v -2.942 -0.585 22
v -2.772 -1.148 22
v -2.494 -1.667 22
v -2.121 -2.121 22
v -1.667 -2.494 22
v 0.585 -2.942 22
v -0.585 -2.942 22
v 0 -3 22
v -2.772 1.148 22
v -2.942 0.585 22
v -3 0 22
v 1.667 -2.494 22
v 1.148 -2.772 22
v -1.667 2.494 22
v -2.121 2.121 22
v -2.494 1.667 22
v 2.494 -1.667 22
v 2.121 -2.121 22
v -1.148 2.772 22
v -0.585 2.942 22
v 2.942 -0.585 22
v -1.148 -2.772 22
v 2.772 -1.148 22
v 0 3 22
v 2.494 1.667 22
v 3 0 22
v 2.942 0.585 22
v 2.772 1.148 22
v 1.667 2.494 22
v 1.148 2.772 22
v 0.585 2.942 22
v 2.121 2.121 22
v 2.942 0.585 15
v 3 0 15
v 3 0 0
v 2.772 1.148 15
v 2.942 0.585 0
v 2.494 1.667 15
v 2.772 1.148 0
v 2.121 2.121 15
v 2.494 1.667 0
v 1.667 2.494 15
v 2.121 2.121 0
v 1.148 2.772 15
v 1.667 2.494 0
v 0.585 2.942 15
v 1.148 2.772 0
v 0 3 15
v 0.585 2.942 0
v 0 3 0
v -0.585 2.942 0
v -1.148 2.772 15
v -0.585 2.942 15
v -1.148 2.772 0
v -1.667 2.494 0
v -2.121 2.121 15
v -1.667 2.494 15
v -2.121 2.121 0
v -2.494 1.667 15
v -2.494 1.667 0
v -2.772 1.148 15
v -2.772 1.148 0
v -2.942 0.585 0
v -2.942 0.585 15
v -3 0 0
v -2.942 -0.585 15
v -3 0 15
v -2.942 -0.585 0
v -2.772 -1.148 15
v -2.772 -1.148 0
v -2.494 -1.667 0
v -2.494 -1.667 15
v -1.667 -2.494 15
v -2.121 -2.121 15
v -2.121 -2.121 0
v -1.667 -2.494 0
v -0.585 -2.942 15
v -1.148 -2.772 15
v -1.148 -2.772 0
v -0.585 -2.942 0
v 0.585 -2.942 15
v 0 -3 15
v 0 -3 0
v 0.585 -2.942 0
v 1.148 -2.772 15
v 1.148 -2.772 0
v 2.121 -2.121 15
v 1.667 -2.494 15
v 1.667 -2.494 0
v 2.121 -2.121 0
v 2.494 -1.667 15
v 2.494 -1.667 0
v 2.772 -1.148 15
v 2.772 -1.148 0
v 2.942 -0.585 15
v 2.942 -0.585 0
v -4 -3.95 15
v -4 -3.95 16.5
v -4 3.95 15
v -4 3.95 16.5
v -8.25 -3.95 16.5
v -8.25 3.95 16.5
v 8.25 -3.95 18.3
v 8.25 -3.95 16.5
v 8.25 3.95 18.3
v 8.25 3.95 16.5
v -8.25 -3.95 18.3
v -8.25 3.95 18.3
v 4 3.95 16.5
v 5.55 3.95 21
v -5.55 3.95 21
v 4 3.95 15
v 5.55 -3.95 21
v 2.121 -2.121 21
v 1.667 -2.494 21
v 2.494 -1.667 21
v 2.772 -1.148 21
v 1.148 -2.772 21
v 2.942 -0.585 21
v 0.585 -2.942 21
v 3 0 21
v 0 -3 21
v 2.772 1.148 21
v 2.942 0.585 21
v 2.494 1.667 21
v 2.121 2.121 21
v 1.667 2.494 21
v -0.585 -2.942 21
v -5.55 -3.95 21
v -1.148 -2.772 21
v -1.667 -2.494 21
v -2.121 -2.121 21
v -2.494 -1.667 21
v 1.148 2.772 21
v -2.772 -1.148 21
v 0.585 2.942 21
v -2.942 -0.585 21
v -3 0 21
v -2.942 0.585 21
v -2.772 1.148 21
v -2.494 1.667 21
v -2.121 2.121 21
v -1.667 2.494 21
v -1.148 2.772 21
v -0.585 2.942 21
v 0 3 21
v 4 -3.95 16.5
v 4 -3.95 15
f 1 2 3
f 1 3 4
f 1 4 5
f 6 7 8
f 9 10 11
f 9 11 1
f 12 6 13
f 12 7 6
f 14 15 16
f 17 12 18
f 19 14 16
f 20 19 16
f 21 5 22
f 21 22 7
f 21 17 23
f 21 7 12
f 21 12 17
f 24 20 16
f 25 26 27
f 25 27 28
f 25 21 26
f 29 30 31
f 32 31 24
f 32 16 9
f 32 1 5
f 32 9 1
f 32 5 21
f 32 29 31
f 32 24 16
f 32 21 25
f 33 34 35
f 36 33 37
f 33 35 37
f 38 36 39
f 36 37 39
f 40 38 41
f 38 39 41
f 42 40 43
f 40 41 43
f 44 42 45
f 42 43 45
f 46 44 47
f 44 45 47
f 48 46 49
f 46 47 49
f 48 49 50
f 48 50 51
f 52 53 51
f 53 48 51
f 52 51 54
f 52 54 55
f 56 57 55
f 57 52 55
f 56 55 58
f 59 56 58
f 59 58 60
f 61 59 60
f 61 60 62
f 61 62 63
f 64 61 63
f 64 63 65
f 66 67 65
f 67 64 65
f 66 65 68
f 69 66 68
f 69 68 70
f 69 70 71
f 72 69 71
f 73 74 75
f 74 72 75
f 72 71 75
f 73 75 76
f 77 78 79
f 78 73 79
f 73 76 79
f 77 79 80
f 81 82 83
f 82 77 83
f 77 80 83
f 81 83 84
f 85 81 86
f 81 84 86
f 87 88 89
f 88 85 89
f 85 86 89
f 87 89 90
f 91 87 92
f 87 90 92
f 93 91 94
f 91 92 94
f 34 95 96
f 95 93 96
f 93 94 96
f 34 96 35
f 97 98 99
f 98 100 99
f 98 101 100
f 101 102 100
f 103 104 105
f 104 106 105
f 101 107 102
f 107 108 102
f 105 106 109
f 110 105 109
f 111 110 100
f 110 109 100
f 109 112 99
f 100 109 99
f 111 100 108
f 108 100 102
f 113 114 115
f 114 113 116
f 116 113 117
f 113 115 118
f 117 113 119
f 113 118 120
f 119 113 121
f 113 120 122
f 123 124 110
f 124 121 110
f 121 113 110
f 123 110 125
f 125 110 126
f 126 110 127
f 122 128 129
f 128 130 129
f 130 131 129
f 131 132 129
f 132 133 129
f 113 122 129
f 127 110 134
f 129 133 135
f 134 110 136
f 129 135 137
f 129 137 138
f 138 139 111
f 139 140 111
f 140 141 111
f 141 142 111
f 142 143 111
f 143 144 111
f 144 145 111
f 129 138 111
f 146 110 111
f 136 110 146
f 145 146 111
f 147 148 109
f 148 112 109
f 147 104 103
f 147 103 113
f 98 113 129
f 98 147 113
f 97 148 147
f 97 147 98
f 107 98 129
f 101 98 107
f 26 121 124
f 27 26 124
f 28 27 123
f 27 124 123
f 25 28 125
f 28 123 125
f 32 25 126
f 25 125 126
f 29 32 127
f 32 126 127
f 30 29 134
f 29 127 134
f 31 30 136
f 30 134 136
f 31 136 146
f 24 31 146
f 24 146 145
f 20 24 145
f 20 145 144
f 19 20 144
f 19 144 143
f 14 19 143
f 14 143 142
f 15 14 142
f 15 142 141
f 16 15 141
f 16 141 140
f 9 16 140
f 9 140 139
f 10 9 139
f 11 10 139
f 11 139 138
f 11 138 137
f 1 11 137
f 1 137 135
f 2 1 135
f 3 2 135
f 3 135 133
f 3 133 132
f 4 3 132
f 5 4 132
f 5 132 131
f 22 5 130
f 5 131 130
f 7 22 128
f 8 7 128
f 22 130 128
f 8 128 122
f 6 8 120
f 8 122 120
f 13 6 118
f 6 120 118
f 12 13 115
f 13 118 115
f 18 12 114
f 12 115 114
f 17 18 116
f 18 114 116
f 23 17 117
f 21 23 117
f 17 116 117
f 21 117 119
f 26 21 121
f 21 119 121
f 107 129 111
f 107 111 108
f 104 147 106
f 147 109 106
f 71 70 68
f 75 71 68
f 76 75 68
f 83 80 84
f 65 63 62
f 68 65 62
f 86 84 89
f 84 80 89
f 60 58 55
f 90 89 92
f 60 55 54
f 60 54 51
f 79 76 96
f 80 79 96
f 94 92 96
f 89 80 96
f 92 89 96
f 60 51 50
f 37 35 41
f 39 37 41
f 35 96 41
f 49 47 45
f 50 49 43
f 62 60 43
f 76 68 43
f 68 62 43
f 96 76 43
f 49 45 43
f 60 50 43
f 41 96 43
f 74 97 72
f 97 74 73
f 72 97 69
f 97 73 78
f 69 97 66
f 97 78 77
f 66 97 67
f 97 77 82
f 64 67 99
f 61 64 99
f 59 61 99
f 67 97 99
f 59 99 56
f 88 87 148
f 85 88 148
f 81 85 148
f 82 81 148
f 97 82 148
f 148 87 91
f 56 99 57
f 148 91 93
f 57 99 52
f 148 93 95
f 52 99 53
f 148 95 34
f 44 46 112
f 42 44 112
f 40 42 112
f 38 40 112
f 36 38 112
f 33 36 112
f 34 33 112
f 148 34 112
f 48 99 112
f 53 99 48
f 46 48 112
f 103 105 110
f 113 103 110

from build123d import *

# Parameters (mm, degrees)
SKETCH1_R           = 3
BOSS_EXTRUDE1_DEPTH = 22
BOSS_EXTRUDE2_DEPTH = 3.95


with BuildPart() as part:
    # Sketch1 → Boss-Extrude1 (new body)
    with BuildSketch(Plane.XY):
        Circle(SKETCH1_R)
    extrude(amount=BOSS_EXTRUDE1_DEPTH)

    # Sketch2 → Boss-Extrude2 (add, symmetric)
    with BuildSketch(Plane(origin=(0, 0, 0), x_dir=(1, 0, 0), z_dir=(0, 1, 0))):
        Polygon((-5.55, -21), (-8.25, -18.3), (-8.25, -16.5), (-4, -16.5), (-4, -15), (4, -15), (4, -16.5), (8.25, -16.5), (8.25, -18.3), (5.55, -21), align=None)
    extrude(amount=BOSS_EXTRUDE2_DEPTH, both=True)


solid = part.part
